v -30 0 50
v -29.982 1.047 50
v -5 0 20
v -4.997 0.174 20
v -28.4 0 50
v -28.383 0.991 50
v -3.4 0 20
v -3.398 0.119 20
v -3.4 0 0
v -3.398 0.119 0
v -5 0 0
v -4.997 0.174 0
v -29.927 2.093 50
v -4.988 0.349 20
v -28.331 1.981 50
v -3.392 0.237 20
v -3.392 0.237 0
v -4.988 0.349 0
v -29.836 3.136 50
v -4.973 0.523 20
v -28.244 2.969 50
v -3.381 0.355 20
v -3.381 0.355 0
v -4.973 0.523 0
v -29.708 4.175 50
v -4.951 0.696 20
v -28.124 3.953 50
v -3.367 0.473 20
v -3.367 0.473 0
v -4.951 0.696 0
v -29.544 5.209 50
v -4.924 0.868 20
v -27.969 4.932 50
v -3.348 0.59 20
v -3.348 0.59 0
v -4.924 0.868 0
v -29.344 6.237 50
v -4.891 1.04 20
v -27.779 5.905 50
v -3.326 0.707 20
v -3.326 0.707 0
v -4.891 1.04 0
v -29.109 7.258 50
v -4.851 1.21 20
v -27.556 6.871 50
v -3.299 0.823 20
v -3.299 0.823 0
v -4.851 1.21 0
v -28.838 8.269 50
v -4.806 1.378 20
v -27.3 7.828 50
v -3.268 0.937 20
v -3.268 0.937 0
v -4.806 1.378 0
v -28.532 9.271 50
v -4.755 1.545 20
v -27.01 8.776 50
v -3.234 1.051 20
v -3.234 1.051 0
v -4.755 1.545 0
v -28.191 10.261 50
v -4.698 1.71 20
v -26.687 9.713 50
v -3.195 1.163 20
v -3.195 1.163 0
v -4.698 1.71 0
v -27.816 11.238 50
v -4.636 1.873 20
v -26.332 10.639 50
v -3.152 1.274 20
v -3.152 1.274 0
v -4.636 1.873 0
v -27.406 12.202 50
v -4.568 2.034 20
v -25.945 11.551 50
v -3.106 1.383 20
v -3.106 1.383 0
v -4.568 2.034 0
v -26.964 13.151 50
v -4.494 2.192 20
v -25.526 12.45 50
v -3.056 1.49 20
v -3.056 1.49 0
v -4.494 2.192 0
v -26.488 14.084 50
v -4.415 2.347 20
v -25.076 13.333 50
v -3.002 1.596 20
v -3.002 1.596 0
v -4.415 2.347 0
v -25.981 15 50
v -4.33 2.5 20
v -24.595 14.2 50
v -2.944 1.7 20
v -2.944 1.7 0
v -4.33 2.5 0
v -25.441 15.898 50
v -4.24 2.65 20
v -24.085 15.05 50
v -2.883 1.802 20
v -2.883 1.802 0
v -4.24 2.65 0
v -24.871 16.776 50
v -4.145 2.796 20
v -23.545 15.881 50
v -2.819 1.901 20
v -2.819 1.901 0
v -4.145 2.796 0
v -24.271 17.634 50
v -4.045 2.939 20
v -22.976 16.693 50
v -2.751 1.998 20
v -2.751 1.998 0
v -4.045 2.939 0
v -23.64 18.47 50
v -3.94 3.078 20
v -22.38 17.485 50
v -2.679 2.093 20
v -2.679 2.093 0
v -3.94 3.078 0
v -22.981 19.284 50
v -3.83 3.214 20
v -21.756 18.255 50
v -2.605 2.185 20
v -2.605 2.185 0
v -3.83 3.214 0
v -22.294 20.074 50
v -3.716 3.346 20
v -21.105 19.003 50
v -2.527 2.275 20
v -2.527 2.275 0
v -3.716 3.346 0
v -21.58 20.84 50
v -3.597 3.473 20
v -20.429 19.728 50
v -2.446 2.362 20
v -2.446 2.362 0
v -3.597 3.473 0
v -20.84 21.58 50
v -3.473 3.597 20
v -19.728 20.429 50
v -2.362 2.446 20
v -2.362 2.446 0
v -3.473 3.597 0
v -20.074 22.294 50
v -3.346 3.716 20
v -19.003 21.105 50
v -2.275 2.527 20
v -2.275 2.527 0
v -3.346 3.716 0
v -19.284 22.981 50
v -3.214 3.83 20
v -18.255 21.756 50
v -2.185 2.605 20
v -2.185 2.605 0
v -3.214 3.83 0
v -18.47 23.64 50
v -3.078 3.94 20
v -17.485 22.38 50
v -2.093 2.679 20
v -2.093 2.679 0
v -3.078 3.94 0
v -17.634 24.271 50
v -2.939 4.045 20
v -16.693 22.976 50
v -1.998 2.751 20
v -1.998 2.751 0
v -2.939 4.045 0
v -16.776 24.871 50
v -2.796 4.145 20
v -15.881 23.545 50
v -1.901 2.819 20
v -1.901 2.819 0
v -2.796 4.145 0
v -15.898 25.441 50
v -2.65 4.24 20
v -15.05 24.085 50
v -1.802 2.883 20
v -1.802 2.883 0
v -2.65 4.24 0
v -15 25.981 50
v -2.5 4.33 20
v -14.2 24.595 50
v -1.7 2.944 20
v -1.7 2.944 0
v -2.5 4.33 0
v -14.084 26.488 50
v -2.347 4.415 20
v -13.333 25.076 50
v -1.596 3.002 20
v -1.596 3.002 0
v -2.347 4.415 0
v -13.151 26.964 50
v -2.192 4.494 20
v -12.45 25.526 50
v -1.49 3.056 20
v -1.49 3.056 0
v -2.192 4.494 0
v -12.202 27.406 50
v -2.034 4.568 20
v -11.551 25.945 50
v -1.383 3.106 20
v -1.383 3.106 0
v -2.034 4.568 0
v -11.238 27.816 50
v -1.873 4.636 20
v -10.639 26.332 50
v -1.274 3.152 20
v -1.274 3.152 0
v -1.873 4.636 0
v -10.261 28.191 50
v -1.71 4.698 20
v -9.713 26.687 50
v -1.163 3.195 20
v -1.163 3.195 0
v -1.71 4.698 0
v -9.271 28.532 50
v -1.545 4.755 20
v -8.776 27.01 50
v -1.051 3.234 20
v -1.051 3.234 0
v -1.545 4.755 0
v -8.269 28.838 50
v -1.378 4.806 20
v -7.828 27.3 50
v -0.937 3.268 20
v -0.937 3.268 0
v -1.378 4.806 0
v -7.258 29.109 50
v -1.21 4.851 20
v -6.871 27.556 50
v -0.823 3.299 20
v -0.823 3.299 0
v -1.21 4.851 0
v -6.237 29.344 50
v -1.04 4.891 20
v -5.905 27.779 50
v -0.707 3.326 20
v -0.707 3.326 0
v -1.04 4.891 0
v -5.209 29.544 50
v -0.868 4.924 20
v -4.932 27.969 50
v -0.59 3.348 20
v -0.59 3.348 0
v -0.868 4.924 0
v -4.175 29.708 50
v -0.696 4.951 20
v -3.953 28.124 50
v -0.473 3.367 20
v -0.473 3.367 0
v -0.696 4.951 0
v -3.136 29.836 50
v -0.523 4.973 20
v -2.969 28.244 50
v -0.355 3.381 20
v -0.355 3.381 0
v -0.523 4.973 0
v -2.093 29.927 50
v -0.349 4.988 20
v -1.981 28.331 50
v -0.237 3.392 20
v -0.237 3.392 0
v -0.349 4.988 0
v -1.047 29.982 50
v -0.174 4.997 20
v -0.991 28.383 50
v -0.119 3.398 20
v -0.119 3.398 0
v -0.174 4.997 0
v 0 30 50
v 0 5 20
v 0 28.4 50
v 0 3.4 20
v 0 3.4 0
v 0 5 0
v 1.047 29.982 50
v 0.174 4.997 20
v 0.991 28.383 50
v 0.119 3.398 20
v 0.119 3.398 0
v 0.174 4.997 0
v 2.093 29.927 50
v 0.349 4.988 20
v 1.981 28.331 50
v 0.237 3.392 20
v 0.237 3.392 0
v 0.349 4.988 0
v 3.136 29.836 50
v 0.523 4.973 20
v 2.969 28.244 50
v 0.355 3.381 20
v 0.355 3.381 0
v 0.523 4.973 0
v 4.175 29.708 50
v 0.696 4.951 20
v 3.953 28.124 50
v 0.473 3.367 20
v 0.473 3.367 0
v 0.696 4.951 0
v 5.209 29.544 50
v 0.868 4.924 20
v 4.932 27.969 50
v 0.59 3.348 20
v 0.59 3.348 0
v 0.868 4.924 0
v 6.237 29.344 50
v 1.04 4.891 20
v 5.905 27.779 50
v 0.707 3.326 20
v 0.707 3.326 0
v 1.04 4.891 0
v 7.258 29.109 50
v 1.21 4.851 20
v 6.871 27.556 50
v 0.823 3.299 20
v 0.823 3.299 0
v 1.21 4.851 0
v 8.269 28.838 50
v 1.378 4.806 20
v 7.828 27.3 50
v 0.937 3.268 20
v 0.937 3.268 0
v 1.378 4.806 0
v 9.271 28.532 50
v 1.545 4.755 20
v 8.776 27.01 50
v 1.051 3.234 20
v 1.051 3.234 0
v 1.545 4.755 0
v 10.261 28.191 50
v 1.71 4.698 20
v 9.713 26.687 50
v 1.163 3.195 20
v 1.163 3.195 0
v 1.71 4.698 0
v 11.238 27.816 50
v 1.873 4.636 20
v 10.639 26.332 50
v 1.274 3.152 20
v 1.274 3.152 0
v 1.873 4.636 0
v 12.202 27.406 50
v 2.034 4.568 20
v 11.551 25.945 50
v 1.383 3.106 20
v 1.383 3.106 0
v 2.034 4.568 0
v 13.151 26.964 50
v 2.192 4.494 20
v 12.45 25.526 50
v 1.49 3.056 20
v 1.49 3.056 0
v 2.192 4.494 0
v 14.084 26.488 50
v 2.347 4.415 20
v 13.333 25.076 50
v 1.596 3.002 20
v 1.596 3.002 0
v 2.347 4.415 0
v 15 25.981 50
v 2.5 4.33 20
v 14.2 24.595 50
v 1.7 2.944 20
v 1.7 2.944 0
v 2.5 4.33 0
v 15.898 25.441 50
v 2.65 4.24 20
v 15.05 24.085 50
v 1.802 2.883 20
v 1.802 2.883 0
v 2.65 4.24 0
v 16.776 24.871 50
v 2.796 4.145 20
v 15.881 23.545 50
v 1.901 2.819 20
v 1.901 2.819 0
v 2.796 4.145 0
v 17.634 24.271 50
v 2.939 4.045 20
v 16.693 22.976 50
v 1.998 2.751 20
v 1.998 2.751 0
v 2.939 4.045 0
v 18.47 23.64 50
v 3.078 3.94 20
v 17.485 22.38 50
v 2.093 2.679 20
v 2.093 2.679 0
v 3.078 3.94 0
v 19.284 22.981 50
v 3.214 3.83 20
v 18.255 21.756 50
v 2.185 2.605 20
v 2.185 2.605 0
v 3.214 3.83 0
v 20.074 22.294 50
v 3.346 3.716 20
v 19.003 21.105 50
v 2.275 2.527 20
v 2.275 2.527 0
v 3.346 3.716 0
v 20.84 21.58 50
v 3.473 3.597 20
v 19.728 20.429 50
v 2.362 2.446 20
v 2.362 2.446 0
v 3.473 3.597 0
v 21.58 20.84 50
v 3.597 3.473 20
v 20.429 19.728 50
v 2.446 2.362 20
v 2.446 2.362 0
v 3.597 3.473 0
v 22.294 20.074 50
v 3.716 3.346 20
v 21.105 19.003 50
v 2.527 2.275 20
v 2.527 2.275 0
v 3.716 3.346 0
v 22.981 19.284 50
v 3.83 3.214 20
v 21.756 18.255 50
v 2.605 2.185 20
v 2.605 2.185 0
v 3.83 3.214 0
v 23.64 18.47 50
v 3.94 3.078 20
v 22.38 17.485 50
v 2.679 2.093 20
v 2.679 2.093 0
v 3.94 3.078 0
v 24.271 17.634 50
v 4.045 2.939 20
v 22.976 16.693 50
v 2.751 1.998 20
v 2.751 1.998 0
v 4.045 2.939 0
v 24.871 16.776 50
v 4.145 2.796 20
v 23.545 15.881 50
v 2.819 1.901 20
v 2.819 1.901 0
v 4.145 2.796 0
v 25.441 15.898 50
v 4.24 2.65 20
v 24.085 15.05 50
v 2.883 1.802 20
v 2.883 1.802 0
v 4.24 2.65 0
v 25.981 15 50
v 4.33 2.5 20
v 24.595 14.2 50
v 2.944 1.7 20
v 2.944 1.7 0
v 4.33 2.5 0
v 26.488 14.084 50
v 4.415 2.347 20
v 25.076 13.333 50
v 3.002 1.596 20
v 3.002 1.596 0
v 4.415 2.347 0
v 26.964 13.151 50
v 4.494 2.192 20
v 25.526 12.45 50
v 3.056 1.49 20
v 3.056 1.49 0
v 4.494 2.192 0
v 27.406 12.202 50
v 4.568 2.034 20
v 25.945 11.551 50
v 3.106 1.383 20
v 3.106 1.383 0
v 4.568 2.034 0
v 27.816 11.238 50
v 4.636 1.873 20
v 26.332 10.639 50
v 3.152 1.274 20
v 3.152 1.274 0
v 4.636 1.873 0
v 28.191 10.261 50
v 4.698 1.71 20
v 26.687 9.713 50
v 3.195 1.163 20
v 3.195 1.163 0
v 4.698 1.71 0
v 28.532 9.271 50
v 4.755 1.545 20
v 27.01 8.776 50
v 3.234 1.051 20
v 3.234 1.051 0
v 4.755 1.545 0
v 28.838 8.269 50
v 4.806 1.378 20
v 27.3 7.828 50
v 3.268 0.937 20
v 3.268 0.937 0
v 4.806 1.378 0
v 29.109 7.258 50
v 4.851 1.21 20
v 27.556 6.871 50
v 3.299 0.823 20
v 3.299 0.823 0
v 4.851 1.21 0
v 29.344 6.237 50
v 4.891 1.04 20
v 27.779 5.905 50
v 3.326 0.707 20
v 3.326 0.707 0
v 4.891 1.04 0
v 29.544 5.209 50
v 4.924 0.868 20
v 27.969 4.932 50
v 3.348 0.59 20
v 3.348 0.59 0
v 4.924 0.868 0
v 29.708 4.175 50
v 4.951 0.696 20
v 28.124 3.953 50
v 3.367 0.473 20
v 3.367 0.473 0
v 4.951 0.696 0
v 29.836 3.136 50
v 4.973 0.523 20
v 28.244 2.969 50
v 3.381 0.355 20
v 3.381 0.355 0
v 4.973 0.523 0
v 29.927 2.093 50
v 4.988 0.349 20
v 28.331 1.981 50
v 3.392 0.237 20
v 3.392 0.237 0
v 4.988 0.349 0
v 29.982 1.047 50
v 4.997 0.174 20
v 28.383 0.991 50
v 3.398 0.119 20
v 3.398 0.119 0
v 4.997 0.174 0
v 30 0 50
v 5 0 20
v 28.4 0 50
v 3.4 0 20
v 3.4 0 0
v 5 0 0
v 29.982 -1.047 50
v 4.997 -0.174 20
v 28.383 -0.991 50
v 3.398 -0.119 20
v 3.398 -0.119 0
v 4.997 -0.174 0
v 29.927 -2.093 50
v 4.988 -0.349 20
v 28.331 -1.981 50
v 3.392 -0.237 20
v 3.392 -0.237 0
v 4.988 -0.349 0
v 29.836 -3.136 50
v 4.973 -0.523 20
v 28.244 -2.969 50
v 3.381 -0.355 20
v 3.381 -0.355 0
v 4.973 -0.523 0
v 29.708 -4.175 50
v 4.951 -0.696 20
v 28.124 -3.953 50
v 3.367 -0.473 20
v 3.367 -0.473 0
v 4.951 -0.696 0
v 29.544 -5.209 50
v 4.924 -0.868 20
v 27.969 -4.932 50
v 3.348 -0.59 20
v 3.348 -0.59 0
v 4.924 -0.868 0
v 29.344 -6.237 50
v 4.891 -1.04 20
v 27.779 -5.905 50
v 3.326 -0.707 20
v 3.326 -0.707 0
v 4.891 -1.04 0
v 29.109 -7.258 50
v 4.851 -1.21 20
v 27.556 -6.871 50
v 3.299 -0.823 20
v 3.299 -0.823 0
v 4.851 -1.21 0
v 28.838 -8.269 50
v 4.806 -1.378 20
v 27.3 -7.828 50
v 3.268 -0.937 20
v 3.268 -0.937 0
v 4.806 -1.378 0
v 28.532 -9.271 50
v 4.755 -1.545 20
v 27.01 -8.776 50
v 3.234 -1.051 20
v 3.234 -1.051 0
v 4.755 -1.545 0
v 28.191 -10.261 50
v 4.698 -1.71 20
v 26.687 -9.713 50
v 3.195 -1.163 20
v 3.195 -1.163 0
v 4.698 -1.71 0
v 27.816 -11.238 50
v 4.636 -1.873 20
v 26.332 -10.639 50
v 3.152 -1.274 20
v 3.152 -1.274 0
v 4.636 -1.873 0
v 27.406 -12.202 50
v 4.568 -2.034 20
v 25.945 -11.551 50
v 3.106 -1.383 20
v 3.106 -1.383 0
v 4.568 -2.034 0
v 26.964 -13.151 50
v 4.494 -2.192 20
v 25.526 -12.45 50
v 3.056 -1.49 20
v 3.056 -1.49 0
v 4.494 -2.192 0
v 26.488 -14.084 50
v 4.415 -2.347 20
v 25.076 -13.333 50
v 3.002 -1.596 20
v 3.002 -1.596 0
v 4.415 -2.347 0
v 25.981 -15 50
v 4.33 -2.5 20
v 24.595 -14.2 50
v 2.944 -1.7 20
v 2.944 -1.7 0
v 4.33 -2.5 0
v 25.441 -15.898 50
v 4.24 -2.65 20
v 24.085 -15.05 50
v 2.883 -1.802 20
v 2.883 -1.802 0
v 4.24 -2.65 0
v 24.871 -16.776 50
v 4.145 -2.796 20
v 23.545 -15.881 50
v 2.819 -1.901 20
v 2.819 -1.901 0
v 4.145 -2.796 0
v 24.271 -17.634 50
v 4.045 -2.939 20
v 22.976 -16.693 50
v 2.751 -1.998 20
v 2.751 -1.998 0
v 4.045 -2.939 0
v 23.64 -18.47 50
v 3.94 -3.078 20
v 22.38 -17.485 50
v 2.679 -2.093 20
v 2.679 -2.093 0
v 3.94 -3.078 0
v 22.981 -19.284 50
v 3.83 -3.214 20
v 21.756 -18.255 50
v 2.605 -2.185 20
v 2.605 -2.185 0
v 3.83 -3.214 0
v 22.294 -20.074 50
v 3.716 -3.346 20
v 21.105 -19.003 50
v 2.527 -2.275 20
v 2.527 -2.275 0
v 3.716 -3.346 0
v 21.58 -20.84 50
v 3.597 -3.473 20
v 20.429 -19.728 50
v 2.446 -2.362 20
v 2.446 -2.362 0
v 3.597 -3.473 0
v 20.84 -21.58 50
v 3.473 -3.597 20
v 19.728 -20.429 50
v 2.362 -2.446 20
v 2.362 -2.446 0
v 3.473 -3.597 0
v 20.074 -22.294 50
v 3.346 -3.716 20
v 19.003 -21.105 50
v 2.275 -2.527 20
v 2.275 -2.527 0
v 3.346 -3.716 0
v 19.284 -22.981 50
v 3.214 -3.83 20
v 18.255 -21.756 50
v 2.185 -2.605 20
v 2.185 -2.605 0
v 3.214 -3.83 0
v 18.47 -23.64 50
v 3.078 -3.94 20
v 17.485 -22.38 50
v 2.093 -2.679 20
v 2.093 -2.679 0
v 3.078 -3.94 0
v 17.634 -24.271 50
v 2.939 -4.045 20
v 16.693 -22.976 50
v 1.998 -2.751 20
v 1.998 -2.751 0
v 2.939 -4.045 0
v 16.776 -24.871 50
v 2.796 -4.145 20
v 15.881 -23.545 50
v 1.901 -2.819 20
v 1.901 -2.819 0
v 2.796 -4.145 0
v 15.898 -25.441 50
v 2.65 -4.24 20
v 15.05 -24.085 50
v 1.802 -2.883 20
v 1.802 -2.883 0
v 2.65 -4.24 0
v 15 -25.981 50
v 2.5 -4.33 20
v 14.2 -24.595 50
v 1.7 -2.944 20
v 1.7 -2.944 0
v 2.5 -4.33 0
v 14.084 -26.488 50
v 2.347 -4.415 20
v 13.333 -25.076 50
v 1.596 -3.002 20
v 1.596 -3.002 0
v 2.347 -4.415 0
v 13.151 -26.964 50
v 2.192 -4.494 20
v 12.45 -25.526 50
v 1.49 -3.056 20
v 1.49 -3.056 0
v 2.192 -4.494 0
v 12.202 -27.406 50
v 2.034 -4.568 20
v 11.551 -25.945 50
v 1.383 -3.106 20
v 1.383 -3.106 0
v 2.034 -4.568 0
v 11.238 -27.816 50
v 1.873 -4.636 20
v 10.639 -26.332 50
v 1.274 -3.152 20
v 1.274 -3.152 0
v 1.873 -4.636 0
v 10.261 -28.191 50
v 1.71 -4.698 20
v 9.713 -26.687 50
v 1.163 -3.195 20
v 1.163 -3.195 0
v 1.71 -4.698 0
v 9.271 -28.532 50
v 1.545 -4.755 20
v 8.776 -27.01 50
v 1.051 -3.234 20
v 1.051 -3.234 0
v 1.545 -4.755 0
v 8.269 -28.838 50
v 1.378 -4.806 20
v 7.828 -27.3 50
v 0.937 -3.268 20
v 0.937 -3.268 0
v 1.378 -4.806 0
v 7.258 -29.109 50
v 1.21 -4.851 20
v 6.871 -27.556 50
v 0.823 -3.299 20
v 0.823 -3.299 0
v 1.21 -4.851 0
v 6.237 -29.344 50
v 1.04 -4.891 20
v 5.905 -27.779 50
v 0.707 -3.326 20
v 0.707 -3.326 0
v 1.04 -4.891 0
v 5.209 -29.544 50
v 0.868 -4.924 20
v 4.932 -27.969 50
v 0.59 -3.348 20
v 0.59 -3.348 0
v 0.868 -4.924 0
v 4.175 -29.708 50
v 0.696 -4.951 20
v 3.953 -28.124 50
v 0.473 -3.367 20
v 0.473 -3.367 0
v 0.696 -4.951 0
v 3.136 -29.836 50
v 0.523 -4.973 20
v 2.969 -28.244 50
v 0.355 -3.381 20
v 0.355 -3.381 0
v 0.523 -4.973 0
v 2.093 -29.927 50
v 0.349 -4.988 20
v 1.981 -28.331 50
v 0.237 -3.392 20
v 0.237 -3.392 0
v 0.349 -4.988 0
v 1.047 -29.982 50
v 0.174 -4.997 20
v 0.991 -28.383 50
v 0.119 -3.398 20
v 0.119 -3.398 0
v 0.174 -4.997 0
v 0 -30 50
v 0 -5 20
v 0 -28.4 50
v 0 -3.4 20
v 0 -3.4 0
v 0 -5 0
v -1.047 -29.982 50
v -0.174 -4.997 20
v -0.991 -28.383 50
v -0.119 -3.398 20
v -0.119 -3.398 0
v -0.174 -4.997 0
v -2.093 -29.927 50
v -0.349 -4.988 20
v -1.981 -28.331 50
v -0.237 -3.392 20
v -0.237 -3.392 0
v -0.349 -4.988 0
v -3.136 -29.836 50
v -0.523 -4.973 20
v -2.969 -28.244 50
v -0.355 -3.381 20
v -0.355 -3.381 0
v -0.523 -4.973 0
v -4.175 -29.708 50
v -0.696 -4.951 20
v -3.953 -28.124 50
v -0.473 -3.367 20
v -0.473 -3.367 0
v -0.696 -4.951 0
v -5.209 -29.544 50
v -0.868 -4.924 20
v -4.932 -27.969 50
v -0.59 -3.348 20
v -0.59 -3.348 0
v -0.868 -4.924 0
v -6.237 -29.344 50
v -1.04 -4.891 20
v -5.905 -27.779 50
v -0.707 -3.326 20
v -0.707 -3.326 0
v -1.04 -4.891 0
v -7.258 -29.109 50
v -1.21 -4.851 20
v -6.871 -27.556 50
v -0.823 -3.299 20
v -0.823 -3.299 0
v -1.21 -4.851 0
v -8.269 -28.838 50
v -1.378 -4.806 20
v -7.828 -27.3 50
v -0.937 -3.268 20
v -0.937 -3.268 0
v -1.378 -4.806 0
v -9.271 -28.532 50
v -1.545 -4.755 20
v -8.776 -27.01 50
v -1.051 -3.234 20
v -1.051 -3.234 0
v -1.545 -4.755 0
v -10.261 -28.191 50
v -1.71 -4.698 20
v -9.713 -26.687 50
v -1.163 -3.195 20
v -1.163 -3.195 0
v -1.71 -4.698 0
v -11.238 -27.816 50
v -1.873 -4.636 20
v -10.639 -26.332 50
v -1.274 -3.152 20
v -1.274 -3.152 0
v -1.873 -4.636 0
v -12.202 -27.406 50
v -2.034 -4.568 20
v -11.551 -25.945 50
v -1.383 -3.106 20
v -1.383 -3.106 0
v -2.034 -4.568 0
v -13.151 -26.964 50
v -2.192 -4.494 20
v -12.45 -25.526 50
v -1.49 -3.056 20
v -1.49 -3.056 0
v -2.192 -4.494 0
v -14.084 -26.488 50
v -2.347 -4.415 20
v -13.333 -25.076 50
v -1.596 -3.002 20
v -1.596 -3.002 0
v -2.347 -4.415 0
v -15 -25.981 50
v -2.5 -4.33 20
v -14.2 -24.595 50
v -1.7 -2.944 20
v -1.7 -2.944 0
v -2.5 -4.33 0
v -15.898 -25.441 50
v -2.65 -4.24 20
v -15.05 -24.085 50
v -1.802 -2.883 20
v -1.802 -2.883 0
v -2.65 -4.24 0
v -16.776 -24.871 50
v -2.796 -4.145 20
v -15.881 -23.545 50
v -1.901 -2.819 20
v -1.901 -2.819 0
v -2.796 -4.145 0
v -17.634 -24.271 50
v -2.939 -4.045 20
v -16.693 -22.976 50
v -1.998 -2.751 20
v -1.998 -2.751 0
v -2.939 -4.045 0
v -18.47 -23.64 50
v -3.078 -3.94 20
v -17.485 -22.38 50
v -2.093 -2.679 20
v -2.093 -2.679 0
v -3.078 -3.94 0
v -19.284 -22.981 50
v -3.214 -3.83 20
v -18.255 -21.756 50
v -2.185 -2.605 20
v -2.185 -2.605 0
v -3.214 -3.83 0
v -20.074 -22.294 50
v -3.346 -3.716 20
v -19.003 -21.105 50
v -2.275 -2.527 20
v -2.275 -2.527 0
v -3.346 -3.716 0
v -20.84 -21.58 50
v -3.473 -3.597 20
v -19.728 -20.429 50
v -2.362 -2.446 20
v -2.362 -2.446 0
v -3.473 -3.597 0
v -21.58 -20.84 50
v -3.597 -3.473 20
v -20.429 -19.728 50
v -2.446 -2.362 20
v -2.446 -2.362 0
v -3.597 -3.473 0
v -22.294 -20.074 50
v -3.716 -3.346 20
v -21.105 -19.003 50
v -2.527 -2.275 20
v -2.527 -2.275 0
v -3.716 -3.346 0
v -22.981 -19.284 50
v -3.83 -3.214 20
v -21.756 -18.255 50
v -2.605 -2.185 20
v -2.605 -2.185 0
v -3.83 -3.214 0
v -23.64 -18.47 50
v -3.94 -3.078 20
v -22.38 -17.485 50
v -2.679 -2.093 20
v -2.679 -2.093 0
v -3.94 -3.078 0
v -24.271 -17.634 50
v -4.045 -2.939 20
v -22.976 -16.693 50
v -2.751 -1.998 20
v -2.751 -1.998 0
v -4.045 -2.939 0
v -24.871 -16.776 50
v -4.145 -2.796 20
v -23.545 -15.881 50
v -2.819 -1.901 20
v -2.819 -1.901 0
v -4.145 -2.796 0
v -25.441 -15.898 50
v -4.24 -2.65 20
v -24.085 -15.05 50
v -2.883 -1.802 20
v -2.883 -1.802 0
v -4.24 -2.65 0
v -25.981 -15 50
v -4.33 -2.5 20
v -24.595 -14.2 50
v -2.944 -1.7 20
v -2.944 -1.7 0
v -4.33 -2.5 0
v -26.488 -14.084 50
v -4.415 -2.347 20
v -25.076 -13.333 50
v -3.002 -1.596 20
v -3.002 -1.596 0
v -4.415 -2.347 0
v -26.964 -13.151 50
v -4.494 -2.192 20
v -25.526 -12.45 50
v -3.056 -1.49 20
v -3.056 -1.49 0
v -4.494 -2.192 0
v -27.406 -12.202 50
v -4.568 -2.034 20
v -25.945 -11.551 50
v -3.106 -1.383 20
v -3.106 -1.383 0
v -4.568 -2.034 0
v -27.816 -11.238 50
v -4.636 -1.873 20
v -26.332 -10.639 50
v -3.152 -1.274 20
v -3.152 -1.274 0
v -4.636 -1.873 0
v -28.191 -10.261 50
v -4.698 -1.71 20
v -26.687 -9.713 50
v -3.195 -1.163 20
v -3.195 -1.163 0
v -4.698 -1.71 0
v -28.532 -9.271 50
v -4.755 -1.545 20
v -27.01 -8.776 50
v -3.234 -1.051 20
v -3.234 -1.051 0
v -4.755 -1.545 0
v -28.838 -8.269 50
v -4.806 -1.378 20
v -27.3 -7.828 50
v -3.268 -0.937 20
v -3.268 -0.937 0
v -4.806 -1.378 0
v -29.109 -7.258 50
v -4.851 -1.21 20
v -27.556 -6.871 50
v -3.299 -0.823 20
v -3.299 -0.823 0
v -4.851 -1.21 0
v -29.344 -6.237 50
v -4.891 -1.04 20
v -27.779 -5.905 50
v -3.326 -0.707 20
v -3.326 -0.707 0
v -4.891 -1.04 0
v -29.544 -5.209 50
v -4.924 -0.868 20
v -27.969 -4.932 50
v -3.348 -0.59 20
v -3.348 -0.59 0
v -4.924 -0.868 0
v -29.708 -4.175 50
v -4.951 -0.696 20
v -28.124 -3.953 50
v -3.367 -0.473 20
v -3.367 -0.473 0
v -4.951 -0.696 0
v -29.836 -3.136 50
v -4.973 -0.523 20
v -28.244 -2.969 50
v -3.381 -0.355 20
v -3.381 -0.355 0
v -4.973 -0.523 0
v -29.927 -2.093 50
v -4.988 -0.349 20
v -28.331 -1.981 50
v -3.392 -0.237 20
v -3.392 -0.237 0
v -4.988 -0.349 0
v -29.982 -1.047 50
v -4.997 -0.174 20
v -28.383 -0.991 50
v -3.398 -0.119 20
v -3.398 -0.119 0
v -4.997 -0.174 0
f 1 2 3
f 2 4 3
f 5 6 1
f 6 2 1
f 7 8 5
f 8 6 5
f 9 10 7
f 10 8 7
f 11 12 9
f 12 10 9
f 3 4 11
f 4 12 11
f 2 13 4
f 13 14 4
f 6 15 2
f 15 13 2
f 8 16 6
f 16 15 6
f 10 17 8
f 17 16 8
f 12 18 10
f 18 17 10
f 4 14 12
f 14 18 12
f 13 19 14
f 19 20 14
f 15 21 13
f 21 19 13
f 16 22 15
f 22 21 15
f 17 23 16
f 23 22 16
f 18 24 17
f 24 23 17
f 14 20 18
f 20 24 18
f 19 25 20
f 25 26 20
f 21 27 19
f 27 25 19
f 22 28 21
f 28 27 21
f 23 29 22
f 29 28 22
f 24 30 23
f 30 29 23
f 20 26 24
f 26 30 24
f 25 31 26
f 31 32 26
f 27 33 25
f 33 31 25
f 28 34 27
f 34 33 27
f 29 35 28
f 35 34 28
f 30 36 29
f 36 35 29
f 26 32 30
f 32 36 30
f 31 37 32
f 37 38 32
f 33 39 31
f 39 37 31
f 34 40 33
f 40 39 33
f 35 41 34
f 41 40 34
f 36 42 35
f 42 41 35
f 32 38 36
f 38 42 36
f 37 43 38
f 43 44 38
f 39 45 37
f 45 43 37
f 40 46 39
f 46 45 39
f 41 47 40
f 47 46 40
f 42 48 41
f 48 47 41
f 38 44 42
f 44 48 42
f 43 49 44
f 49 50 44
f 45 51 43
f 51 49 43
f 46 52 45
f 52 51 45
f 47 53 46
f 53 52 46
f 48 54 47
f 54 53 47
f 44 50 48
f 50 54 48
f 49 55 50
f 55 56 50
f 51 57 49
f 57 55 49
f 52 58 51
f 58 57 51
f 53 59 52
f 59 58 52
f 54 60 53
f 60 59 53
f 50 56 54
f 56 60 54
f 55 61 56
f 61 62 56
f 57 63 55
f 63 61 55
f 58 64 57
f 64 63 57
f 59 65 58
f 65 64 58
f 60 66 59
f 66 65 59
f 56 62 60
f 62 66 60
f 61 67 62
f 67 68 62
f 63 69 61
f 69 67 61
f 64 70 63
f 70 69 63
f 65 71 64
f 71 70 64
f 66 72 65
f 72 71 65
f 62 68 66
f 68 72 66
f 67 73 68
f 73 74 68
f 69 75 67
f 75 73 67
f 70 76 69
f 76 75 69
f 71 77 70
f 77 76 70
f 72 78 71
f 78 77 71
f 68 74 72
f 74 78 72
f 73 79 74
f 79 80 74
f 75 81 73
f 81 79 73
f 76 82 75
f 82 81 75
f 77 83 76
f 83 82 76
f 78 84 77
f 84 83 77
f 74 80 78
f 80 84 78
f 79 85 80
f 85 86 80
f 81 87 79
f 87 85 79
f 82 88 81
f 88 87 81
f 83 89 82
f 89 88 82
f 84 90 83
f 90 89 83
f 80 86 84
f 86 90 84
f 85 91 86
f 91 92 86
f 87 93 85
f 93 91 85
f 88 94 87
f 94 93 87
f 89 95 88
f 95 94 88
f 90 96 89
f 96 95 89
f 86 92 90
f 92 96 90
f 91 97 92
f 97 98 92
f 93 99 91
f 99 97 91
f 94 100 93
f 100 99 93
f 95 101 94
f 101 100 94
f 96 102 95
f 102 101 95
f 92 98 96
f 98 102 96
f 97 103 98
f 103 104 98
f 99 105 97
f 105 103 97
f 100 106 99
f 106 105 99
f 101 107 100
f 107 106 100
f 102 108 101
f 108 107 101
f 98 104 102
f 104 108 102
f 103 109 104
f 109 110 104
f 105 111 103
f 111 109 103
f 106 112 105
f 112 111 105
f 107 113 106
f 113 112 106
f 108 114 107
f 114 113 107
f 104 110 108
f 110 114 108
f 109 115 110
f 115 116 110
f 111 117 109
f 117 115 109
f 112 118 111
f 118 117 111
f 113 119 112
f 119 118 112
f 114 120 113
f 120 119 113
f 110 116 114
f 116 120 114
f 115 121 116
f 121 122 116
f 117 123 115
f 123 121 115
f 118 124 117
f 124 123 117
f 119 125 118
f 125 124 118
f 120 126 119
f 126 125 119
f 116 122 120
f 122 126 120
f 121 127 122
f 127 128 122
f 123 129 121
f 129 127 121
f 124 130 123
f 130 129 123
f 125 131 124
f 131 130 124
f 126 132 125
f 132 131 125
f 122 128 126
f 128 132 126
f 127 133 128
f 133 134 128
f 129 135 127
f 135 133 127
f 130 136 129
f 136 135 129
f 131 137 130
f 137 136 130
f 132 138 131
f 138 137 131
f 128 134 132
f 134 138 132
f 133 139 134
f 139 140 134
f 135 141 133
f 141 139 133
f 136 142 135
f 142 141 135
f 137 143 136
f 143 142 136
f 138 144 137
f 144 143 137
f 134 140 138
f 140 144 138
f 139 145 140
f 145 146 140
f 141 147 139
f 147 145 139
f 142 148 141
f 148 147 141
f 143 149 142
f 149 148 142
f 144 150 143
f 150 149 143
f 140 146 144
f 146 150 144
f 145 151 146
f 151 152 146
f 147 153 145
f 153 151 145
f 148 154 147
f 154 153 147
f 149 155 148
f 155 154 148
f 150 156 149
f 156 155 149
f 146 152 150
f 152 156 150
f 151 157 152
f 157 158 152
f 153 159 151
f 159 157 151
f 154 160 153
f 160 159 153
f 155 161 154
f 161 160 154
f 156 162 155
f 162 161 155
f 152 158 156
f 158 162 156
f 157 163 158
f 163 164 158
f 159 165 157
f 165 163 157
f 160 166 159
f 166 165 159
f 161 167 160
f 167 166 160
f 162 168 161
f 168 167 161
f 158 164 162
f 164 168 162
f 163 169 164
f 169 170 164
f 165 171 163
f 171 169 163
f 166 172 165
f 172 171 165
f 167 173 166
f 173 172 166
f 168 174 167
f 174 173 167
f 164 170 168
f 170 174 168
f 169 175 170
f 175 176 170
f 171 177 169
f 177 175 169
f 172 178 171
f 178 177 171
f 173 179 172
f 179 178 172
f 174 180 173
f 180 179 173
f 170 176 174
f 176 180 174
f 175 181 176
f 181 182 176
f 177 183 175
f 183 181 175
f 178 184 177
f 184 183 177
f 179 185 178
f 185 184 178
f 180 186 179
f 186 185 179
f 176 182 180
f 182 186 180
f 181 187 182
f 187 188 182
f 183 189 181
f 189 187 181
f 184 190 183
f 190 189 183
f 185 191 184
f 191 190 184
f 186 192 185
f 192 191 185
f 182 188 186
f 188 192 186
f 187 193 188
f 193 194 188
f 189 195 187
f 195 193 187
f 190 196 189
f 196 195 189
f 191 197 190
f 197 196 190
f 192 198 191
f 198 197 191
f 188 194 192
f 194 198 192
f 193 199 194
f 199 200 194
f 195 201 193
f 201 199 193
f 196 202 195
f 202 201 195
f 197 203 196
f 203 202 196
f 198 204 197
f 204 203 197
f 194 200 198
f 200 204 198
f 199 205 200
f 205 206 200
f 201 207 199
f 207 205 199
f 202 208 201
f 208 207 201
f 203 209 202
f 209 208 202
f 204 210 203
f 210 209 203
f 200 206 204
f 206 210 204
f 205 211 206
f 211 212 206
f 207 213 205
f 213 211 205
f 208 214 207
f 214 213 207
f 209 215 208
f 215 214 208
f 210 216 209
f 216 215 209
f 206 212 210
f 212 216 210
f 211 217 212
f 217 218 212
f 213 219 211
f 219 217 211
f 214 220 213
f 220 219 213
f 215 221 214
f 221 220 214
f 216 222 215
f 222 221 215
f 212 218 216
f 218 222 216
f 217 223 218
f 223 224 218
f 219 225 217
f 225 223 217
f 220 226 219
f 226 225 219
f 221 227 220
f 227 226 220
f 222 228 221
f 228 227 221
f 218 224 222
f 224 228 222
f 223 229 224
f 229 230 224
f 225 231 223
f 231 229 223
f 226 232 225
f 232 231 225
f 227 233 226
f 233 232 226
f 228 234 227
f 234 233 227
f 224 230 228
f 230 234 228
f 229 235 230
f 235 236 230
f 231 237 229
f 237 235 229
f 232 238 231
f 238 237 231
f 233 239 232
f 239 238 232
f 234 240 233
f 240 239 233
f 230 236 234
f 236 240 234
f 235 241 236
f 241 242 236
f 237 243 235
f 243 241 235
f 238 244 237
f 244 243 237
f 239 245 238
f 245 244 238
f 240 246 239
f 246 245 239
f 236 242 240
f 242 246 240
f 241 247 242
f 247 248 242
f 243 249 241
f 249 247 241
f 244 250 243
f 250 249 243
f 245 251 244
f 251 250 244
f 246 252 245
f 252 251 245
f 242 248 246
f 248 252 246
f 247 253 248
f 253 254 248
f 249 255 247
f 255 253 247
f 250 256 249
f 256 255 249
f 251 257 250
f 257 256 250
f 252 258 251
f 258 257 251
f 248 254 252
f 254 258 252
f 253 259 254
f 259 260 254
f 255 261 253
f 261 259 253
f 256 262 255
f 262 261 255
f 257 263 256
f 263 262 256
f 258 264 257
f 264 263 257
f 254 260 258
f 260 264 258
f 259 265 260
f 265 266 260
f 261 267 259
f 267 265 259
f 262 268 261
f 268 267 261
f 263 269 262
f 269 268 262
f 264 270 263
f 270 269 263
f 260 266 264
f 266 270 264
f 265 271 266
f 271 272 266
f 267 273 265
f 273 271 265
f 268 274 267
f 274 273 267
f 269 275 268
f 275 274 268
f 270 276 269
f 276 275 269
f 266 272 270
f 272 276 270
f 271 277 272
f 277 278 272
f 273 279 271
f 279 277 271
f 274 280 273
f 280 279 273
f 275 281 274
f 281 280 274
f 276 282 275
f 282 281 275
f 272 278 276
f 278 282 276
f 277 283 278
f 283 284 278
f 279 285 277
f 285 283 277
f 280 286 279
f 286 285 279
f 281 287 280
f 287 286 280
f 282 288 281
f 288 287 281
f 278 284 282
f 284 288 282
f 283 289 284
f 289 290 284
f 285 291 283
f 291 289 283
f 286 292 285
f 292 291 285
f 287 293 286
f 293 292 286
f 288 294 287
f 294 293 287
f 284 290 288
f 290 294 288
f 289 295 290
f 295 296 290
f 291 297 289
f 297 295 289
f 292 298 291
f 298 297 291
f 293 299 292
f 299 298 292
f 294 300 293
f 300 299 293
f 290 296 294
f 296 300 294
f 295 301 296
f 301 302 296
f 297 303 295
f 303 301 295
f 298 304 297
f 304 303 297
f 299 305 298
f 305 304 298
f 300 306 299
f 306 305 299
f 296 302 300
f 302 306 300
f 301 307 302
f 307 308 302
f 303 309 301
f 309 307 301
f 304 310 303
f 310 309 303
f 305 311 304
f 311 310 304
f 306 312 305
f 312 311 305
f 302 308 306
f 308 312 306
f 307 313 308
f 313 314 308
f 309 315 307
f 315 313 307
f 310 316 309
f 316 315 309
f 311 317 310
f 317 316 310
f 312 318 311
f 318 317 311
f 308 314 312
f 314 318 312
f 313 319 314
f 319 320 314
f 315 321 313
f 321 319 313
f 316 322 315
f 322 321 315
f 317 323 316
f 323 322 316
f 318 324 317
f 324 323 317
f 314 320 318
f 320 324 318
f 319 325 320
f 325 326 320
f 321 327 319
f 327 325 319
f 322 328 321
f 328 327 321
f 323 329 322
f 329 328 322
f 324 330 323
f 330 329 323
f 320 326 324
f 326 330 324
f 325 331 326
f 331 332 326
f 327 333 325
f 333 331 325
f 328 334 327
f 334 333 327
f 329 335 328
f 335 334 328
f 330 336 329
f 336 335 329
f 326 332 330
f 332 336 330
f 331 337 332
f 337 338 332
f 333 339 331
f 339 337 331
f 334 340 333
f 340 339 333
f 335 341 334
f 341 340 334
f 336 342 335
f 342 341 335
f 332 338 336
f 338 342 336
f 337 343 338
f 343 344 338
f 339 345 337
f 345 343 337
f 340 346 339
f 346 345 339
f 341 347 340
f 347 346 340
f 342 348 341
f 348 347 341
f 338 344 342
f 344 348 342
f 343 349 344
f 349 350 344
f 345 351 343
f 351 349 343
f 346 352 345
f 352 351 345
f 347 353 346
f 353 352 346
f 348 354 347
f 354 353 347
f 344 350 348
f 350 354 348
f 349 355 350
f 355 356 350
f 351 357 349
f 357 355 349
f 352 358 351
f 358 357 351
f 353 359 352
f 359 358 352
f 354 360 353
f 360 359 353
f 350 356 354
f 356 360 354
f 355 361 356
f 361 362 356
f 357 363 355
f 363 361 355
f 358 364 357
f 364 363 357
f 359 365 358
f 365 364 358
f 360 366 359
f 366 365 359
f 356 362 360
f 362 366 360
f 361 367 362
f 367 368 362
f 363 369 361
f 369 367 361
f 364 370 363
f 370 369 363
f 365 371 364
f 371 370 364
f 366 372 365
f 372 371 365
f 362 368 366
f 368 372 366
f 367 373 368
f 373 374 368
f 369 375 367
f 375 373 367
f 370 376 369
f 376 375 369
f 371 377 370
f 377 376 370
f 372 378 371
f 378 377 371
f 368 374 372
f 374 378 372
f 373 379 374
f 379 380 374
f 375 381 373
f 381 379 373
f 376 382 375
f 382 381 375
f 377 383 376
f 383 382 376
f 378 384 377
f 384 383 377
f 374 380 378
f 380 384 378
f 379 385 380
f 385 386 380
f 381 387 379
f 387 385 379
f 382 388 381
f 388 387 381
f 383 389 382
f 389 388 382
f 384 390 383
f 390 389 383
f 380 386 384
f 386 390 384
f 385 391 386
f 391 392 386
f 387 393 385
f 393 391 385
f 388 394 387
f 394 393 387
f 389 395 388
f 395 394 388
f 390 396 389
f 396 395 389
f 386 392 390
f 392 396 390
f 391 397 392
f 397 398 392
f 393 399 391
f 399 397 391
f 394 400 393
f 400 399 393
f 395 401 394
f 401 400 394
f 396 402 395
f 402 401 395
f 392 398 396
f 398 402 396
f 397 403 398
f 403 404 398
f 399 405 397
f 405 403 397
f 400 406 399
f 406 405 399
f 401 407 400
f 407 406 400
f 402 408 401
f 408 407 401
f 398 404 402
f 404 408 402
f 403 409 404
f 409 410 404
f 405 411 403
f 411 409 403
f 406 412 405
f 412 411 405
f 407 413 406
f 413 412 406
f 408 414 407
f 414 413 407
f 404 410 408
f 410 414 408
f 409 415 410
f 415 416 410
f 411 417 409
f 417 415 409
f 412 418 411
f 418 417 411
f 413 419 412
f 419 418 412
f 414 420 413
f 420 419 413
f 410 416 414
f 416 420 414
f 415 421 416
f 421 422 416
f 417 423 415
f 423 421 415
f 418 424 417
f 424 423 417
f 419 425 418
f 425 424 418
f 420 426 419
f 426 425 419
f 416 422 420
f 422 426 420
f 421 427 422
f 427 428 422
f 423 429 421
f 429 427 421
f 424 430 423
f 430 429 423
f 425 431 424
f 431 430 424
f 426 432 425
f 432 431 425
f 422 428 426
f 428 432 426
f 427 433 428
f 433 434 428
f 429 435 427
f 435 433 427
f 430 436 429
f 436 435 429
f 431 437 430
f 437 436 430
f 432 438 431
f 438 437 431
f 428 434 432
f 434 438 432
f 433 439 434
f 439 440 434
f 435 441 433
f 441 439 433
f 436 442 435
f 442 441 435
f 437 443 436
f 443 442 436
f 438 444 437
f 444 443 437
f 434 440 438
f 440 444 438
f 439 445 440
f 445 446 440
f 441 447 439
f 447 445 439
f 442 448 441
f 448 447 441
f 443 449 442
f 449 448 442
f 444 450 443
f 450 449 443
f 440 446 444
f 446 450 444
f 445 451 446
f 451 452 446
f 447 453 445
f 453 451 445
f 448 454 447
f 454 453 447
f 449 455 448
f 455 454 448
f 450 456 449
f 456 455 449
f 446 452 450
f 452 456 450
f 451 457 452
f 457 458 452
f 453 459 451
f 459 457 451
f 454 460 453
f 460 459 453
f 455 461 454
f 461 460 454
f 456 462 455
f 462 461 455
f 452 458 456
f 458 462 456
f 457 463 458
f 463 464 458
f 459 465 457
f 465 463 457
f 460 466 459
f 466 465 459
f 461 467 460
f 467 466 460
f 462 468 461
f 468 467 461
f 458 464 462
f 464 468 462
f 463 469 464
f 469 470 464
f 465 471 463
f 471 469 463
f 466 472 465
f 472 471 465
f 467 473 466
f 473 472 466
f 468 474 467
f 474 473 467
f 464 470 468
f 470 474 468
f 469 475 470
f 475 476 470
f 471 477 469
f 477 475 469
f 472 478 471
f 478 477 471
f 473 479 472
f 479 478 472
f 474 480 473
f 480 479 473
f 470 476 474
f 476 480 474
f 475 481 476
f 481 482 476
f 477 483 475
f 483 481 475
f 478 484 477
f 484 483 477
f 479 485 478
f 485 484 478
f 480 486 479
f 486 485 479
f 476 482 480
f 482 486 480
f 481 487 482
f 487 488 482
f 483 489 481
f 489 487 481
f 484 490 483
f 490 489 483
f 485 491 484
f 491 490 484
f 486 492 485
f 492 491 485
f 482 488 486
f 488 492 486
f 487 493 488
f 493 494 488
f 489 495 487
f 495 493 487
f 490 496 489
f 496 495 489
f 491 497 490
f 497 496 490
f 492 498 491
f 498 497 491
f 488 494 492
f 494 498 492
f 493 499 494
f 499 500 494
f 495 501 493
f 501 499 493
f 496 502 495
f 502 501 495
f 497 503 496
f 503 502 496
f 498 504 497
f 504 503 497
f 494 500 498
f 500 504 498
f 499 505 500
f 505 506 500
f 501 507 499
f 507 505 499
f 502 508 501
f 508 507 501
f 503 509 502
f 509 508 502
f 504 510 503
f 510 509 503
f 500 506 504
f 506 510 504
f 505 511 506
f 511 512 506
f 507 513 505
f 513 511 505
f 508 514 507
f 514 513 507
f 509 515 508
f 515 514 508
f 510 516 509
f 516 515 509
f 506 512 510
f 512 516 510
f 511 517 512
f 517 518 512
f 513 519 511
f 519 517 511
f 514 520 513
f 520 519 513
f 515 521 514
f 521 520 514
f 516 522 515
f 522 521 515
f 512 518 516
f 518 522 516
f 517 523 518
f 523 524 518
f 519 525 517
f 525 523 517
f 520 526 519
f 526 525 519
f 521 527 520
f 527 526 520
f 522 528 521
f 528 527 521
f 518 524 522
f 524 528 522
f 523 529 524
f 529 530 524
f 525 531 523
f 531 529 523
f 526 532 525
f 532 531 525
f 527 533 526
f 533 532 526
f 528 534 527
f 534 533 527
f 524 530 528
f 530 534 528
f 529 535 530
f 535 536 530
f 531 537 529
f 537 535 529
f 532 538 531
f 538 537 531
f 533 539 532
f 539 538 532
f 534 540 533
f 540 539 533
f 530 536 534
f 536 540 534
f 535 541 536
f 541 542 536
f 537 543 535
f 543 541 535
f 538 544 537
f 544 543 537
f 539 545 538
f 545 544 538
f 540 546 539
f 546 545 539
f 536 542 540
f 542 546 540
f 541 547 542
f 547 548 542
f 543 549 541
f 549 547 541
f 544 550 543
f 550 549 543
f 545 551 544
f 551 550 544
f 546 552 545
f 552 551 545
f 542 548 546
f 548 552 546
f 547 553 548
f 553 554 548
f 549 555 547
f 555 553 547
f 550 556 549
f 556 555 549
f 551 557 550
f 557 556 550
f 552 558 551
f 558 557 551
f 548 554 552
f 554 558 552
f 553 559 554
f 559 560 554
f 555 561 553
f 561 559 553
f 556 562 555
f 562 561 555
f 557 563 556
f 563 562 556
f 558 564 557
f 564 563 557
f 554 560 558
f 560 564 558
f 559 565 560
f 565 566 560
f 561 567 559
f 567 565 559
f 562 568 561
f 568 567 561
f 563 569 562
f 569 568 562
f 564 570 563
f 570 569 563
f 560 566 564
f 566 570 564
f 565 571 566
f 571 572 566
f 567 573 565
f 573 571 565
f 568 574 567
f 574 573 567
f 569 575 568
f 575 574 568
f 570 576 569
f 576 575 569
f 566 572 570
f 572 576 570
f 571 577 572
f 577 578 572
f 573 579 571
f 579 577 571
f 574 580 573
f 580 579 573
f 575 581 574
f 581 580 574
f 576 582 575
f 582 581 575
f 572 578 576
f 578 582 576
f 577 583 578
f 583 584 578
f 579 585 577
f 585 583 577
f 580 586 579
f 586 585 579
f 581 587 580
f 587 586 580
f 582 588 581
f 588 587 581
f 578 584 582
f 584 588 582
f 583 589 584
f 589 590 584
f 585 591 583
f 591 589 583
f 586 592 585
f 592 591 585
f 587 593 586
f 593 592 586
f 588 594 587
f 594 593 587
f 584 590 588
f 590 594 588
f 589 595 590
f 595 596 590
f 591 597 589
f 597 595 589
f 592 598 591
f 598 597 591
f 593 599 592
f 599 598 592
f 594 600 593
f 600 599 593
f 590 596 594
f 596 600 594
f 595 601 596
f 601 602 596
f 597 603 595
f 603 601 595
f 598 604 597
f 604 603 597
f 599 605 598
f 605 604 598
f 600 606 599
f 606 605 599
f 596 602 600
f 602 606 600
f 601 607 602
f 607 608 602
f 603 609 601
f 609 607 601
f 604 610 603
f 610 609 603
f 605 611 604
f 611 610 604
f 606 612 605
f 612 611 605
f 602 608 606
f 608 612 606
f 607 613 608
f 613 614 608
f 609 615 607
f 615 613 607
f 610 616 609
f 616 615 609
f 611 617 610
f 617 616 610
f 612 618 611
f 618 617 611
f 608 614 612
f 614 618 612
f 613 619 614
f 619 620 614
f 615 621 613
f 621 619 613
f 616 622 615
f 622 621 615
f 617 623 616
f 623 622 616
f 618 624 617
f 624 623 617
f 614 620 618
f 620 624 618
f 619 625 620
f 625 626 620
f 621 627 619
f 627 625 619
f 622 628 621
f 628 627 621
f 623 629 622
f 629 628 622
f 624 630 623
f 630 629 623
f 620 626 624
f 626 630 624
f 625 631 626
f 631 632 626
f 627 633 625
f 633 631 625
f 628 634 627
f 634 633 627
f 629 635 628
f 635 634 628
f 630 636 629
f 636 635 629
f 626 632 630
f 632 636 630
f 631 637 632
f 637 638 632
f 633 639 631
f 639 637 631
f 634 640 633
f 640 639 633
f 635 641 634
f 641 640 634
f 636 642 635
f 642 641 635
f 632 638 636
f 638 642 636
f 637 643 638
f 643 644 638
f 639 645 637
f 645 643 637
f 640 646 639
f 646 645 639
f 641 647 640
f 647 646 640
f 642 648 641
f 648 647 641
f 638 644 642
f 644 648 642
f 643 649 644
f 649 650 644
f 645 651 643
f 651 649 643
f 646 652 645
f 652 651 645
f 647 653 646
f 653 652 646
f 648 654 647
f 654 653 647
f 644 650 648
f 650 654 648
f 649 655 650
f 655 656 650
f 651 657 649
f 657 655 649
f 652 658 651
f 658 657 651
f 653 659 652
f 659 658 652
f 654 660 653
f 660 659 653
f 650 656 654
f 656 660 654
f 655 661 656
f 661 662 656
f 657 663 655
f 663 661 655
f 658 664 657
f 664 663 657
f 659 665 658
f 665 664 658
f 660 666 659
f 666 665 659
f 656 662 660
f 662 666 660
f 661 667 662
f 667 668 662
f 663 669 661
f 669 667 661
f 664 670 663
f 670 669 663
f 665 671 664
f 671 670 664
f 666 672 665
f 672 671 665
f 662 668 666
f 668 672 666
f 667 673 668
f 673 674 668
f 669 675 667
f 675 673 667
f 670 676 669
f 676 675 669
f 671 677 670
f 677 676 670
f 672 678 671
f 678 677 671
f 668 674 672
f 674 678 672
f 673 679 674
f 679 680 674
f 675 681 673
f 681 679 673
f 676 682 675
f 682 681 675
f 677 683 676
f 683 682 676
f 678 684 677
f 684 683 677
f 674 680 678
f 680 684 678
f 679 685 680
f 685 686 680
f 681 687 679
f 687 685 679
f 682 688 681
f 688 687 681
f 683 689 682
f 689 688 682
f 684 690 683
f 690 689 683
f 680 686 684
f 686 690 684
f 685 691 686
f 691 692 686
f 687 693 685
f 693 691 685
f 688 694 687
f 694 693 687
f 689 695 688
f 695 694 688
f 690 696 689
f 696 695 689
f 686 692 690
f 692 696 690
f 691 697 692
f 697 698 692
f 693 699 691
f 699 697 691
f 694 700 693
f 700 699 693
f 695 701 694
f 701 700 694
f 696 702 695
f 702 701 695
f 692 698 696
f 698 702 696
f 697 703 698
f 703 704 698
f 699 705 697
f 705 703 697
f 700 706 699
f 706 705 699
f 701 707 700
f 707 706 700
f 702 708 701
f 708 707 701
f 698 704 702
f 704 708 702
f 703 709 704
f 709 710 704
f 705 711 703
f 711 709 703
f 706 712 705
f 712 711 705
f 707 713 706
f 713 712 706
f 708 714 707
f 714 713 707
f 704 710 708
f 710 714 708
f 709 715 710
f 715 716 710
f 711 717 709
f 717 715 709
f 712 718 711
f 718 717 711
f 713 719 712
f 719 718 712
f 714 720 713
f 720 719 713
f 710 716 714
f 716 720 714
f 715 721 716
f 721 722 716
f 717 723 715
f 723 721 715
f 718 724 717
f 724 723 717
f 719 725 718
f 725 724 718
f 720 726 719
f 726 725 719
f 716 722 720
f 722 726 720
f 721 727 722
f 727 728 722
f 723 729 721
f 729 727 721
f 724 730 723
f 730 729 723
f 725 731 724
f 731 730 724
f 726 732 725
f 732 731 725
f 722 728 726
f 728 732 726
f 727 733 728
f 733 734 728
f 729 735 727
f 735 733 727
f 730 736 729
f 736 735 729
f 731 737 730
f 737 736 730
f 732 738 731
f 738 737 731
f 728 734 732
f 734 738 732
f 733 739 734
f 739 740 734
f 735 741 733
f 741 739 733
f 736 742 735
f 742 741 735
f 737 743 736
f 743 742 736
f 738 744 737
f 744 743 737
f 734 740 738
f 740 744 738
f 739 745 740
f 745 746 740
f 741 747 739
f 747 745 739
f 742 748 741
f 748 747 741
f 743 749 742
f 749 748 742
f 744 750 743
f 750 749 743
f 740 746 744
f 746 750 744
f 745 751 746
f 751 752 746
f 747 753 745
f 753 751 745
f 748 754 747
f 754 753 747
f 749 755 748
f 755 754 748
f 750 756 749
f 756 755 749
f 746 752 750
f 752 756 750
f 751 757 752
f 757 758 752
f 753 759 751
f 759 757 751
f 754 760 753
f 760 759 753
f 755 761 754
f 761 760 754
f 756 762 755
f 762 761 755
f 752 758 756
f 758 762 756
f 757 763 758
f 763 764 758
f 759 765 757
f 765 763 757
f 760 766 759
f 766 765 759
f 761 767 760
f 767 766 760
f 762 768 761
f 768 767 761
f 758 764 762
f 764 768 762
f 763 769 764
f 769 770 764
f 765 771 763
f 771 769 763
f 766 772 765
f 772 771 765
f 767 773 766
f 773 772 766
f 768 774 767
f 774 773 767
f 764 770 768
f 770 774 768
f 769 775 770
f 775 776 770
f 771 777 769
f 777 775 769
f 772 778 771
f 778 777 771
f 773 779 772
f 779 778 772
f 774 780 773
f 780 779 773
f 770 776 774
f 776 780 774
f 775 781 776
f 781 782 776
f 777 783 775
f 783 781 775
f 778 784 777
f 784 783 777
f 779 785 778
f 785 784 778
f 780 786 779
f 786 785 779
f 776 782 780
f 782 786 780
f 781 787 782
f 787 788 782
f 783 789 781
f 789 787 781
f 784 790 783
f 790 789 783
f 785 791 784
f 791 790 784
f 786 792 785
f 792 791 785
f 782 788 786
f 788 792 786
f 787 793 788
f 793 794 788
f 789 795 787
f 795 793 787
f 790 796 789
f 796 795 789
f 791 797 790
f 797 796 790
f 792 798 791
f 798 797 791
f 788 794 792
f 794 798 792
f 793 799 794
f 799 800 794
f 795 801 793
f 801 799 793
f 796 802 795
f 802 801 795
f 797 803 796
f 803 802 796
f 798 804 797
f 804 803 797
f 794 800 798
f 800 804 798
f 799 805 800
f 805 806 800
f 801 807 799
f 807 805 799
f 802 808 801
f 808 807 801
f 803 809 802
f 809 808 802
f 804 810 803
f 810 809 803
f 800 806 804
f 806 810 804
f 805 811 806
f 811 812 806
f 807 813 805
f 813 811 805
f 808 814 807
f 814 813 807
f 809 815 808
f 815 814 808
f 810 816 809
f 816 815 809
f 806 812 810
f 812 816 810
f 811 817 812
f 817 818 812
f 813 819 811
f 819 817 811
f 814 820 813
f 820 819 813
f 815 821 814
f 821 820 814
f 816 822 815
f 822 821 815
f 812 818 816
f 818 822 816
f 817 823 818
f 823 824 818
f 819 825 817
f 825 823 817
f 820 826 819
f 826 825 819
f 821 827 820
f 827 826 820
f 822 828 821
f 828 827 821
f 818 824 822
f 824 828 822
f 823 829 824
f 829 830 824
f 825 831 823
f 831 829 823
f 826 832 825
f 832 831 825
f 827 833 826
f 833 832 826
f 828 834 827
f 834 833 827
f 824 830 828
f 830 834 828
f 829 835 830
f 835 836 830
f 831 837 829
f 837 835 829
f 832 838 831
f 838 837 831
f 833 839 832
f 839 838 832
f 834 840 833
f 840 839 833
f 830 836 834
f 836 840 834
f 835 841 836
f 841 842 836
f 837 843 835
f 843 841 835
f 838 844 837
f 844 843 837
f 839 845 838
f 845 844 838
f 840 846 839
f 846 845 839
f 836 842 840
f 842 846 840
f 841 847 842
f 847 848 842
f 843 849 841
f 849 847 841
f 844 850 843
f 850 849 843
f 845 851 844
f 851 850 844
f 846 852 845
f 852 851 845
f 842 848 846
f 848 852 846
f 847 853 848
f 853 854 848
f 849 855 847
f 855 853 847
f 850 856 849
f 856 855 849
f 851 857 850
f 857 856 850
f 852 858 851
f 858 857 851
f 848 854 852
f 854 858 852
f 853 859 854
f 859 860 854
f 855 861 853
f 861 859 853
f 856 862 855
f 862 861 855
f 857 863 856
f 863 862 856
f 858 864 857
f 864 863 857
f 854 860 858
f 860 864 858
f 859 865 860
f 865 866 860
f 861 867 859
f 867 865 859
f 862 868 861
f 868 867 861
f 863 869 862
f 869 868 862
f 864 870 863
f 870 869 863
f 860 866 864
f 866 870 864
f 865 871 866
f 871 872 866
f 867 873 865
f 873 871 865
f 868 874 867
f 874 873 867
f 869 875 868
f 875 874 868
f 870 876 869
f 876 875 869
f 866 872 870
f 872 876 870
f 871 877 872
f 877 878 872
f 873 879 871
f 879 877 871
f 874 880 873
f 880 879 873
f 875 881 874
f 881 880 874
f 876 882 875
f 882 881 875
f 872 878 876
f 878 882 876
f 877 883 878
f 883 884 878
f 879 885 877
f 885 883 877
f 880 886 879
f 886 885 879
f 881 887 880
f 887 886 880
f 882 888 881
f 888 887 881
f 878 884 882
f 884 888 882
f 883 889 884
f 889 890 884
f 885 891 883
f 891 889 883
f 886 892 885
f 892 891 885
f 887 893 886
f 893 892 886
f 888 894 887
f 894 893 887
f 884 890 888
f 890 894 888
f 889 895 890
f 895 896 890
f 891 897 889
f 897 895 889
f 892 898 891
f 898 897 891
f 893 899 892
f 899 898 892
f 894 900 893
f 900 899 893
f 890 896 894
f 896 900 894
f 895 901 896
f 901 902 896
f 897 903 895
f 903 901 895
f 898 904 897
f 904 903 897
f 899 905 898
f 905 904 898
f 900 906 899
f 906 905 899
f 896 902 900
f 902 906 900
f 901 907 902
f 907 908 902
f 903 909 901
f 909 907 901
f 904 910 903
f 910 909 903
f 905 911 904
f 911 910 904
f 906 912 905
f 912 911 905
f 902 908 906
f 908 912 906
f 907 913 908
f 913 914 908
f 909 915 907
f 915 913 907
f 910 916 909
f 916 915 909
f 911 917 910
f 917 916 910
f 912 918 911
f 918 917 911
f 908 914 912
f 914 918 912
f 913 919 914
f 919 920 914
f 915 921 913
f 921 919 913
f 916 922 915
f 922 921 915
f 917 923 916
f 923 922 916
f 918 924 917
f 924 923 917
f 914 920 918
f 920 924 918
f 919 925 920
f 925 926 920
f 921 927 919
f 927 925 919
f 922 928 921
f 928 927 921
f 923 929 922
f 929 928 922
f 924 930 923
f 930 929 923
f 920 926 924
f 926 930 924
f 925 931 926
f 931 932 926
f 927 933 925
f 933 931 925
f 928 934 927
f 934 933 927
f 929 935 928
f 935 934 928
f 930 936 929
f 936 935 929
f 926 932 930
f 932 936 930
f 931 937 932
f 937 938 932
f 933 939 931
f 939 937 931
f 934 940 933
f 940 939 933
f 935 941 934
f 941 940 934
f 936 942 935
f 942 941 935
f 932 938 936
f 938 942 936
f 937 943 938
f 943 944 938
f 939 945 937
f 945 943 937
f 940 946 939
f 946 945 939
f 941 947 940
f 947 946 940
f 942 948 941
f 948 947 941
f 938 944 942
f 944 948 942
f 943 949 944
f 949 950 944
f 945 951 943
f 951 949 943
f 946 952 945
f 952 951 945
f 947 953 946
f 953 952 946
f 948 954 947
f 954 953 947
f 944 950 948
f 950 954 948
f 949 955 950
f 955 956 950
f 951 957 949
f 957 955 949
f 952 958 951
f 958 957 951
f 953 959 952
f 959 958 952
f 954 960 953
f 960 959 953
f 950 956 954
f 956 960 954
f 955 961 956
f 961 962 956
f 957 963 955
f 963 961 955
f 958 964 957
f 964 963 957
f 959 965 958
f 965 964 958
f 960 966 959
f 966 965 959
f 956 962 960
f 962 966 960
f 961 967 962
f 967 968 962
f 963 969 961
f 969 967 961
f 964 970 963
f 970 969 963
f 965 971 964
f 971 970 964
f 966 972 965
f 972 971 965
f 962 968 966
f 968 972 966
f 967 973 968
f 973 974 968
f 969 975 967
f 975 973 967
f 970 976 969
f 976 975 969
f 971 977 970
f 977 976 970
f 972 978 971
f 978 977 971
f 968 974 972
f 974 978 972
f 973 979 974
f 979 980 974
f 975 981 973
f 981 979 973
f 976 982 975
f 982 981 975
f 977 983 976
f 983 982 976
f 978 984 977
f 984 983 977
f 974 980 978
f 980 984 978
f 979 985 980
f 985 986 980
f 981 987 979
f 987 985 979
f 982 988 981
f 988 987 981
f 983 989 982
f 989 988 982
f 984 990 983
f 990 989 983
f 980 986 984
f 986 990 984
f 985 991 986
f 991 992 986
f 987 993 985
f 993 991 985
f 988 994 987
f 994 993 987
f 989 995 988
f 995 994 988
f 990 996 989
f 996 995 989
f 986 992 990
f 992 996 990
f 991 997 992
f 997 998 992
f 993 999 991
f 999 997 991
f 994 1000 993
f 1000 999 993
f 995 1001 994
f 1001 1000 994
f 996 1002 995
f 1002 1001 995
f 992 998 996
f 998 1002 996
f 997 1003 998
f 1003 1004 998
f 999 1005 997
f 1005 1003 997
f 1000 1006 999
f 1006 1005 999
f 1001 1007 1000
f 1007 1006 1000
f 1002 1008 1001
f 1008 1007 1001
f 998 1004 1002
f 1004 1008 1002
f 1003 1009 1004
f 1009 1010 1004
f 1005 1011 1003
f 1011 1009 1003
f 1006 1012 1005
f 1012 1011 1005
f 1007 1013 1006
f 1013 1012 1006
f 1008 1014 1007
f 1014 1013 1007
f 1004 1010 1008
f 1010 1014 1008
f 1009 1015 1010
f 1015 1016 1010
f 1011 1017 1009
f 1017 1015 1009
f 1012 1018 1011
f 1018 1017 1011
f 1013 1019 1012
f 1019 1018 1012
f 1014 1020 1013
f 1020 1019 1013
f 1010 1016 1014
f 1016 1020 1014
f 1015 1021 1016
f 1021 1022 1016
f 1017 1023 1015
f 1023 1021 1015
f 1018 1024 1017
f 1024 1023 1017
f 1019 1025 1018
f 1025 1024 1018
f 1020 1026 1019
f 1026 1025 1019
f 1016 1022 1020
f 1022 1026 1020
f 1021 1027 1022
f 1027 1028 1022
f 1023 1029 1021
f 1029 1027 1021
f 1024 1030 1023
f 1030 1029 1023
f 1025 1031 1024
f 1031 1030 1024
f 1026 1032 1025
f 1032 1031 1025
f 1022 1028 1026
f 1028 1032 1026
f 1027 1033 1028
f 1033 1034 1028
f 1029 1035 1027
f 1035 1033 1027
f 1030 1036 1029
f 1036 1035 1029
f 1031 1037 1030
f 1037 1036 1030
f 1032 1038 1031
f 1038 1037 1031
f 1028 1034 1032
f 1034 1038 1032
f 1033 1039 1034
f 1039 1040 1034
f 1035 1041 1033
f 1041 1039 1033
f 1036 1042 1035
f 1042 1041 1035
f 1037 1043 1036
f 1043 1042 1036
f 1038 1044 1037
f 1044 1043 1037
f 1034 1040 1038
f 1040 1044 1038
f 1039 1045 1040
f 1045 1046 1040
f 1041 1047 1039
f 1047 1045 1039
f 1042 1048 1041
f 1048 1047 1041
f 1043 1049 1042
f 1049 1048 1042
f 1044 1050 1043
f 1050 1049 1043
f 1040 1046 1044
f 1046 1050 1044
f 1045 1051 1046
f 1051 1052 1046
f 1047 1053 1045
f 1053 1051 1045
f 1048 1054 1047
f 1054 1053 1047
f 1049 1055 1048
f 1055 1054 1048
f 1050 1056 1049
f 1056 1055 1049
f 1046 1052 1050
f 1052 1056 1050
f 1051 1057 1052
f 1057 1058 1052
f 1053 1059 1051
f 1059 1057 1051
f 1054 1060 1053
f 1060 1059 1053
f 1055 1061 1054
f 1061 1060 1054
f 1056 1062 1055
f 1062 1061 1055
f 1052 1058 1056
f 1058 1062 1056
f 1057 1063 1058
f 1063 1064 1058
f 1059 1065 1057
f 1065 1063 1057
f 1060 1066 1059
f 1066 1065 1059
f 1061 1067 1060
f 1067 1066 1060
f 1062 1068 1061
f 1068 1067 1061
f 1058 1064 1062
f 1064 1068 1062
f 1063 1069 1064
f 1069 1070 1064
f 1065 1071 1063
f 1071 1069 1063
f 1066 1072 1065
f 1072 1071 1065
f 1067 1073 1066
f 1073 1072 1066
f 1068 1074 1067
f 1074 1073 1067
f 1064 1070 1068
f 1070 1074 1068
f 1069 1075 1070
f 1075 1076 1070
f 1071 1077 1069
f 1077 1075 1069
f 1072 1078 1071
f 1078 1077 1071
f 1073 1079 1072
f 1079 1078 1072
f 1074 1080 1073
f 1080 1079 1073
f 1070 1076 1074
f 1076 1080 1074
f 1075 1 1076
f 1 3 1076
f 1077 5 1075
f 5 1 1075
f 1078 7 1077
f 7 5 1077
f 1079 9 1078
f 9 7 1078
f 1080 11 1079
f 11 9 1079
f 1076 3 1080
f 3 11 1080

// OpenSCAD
// Lab funnel, printed upright (wide opening at top), open at both ends

$fn = 180;

spout_od     = 10;    // spout outer diameter
spout_h      = 20;    // spout height (z = 0 to 20)
rim_od       = 60;    // outer diameter at the rim
cone_top_z   = 50;    // z of the rim
wall         = 1.6;   // wall thickness, measured in horizontal cross-section (same in spout and cone)

// derived values
spout_or     = spout_od / 2;          // 5 mm outer spout radius
spout_ir     = spout_or - wall;       // 3.4 mm bore radius (6.8 mm bore diameter)
rim_or       = rim_od / 2;            // 30 mm outer rim radius
rim_ir       = rim_or - wall;         // 28.4 mm inner rim radius

// The inner cone runs parallel to the outer cone, offset by the wall
// thickness in every horizontal slice, so it starts at the bore radius at z = 20.
rotate_extrude(convexity = 10)
    polygon([
        [spout_or, 0],
        [spout_or, spout_h],
        [rim_or,   cone_top_z],
        [rim_ir,   cone_top_z],
        [spout_ir, spout_h],
        [spout_ir, 0]
    ]);
